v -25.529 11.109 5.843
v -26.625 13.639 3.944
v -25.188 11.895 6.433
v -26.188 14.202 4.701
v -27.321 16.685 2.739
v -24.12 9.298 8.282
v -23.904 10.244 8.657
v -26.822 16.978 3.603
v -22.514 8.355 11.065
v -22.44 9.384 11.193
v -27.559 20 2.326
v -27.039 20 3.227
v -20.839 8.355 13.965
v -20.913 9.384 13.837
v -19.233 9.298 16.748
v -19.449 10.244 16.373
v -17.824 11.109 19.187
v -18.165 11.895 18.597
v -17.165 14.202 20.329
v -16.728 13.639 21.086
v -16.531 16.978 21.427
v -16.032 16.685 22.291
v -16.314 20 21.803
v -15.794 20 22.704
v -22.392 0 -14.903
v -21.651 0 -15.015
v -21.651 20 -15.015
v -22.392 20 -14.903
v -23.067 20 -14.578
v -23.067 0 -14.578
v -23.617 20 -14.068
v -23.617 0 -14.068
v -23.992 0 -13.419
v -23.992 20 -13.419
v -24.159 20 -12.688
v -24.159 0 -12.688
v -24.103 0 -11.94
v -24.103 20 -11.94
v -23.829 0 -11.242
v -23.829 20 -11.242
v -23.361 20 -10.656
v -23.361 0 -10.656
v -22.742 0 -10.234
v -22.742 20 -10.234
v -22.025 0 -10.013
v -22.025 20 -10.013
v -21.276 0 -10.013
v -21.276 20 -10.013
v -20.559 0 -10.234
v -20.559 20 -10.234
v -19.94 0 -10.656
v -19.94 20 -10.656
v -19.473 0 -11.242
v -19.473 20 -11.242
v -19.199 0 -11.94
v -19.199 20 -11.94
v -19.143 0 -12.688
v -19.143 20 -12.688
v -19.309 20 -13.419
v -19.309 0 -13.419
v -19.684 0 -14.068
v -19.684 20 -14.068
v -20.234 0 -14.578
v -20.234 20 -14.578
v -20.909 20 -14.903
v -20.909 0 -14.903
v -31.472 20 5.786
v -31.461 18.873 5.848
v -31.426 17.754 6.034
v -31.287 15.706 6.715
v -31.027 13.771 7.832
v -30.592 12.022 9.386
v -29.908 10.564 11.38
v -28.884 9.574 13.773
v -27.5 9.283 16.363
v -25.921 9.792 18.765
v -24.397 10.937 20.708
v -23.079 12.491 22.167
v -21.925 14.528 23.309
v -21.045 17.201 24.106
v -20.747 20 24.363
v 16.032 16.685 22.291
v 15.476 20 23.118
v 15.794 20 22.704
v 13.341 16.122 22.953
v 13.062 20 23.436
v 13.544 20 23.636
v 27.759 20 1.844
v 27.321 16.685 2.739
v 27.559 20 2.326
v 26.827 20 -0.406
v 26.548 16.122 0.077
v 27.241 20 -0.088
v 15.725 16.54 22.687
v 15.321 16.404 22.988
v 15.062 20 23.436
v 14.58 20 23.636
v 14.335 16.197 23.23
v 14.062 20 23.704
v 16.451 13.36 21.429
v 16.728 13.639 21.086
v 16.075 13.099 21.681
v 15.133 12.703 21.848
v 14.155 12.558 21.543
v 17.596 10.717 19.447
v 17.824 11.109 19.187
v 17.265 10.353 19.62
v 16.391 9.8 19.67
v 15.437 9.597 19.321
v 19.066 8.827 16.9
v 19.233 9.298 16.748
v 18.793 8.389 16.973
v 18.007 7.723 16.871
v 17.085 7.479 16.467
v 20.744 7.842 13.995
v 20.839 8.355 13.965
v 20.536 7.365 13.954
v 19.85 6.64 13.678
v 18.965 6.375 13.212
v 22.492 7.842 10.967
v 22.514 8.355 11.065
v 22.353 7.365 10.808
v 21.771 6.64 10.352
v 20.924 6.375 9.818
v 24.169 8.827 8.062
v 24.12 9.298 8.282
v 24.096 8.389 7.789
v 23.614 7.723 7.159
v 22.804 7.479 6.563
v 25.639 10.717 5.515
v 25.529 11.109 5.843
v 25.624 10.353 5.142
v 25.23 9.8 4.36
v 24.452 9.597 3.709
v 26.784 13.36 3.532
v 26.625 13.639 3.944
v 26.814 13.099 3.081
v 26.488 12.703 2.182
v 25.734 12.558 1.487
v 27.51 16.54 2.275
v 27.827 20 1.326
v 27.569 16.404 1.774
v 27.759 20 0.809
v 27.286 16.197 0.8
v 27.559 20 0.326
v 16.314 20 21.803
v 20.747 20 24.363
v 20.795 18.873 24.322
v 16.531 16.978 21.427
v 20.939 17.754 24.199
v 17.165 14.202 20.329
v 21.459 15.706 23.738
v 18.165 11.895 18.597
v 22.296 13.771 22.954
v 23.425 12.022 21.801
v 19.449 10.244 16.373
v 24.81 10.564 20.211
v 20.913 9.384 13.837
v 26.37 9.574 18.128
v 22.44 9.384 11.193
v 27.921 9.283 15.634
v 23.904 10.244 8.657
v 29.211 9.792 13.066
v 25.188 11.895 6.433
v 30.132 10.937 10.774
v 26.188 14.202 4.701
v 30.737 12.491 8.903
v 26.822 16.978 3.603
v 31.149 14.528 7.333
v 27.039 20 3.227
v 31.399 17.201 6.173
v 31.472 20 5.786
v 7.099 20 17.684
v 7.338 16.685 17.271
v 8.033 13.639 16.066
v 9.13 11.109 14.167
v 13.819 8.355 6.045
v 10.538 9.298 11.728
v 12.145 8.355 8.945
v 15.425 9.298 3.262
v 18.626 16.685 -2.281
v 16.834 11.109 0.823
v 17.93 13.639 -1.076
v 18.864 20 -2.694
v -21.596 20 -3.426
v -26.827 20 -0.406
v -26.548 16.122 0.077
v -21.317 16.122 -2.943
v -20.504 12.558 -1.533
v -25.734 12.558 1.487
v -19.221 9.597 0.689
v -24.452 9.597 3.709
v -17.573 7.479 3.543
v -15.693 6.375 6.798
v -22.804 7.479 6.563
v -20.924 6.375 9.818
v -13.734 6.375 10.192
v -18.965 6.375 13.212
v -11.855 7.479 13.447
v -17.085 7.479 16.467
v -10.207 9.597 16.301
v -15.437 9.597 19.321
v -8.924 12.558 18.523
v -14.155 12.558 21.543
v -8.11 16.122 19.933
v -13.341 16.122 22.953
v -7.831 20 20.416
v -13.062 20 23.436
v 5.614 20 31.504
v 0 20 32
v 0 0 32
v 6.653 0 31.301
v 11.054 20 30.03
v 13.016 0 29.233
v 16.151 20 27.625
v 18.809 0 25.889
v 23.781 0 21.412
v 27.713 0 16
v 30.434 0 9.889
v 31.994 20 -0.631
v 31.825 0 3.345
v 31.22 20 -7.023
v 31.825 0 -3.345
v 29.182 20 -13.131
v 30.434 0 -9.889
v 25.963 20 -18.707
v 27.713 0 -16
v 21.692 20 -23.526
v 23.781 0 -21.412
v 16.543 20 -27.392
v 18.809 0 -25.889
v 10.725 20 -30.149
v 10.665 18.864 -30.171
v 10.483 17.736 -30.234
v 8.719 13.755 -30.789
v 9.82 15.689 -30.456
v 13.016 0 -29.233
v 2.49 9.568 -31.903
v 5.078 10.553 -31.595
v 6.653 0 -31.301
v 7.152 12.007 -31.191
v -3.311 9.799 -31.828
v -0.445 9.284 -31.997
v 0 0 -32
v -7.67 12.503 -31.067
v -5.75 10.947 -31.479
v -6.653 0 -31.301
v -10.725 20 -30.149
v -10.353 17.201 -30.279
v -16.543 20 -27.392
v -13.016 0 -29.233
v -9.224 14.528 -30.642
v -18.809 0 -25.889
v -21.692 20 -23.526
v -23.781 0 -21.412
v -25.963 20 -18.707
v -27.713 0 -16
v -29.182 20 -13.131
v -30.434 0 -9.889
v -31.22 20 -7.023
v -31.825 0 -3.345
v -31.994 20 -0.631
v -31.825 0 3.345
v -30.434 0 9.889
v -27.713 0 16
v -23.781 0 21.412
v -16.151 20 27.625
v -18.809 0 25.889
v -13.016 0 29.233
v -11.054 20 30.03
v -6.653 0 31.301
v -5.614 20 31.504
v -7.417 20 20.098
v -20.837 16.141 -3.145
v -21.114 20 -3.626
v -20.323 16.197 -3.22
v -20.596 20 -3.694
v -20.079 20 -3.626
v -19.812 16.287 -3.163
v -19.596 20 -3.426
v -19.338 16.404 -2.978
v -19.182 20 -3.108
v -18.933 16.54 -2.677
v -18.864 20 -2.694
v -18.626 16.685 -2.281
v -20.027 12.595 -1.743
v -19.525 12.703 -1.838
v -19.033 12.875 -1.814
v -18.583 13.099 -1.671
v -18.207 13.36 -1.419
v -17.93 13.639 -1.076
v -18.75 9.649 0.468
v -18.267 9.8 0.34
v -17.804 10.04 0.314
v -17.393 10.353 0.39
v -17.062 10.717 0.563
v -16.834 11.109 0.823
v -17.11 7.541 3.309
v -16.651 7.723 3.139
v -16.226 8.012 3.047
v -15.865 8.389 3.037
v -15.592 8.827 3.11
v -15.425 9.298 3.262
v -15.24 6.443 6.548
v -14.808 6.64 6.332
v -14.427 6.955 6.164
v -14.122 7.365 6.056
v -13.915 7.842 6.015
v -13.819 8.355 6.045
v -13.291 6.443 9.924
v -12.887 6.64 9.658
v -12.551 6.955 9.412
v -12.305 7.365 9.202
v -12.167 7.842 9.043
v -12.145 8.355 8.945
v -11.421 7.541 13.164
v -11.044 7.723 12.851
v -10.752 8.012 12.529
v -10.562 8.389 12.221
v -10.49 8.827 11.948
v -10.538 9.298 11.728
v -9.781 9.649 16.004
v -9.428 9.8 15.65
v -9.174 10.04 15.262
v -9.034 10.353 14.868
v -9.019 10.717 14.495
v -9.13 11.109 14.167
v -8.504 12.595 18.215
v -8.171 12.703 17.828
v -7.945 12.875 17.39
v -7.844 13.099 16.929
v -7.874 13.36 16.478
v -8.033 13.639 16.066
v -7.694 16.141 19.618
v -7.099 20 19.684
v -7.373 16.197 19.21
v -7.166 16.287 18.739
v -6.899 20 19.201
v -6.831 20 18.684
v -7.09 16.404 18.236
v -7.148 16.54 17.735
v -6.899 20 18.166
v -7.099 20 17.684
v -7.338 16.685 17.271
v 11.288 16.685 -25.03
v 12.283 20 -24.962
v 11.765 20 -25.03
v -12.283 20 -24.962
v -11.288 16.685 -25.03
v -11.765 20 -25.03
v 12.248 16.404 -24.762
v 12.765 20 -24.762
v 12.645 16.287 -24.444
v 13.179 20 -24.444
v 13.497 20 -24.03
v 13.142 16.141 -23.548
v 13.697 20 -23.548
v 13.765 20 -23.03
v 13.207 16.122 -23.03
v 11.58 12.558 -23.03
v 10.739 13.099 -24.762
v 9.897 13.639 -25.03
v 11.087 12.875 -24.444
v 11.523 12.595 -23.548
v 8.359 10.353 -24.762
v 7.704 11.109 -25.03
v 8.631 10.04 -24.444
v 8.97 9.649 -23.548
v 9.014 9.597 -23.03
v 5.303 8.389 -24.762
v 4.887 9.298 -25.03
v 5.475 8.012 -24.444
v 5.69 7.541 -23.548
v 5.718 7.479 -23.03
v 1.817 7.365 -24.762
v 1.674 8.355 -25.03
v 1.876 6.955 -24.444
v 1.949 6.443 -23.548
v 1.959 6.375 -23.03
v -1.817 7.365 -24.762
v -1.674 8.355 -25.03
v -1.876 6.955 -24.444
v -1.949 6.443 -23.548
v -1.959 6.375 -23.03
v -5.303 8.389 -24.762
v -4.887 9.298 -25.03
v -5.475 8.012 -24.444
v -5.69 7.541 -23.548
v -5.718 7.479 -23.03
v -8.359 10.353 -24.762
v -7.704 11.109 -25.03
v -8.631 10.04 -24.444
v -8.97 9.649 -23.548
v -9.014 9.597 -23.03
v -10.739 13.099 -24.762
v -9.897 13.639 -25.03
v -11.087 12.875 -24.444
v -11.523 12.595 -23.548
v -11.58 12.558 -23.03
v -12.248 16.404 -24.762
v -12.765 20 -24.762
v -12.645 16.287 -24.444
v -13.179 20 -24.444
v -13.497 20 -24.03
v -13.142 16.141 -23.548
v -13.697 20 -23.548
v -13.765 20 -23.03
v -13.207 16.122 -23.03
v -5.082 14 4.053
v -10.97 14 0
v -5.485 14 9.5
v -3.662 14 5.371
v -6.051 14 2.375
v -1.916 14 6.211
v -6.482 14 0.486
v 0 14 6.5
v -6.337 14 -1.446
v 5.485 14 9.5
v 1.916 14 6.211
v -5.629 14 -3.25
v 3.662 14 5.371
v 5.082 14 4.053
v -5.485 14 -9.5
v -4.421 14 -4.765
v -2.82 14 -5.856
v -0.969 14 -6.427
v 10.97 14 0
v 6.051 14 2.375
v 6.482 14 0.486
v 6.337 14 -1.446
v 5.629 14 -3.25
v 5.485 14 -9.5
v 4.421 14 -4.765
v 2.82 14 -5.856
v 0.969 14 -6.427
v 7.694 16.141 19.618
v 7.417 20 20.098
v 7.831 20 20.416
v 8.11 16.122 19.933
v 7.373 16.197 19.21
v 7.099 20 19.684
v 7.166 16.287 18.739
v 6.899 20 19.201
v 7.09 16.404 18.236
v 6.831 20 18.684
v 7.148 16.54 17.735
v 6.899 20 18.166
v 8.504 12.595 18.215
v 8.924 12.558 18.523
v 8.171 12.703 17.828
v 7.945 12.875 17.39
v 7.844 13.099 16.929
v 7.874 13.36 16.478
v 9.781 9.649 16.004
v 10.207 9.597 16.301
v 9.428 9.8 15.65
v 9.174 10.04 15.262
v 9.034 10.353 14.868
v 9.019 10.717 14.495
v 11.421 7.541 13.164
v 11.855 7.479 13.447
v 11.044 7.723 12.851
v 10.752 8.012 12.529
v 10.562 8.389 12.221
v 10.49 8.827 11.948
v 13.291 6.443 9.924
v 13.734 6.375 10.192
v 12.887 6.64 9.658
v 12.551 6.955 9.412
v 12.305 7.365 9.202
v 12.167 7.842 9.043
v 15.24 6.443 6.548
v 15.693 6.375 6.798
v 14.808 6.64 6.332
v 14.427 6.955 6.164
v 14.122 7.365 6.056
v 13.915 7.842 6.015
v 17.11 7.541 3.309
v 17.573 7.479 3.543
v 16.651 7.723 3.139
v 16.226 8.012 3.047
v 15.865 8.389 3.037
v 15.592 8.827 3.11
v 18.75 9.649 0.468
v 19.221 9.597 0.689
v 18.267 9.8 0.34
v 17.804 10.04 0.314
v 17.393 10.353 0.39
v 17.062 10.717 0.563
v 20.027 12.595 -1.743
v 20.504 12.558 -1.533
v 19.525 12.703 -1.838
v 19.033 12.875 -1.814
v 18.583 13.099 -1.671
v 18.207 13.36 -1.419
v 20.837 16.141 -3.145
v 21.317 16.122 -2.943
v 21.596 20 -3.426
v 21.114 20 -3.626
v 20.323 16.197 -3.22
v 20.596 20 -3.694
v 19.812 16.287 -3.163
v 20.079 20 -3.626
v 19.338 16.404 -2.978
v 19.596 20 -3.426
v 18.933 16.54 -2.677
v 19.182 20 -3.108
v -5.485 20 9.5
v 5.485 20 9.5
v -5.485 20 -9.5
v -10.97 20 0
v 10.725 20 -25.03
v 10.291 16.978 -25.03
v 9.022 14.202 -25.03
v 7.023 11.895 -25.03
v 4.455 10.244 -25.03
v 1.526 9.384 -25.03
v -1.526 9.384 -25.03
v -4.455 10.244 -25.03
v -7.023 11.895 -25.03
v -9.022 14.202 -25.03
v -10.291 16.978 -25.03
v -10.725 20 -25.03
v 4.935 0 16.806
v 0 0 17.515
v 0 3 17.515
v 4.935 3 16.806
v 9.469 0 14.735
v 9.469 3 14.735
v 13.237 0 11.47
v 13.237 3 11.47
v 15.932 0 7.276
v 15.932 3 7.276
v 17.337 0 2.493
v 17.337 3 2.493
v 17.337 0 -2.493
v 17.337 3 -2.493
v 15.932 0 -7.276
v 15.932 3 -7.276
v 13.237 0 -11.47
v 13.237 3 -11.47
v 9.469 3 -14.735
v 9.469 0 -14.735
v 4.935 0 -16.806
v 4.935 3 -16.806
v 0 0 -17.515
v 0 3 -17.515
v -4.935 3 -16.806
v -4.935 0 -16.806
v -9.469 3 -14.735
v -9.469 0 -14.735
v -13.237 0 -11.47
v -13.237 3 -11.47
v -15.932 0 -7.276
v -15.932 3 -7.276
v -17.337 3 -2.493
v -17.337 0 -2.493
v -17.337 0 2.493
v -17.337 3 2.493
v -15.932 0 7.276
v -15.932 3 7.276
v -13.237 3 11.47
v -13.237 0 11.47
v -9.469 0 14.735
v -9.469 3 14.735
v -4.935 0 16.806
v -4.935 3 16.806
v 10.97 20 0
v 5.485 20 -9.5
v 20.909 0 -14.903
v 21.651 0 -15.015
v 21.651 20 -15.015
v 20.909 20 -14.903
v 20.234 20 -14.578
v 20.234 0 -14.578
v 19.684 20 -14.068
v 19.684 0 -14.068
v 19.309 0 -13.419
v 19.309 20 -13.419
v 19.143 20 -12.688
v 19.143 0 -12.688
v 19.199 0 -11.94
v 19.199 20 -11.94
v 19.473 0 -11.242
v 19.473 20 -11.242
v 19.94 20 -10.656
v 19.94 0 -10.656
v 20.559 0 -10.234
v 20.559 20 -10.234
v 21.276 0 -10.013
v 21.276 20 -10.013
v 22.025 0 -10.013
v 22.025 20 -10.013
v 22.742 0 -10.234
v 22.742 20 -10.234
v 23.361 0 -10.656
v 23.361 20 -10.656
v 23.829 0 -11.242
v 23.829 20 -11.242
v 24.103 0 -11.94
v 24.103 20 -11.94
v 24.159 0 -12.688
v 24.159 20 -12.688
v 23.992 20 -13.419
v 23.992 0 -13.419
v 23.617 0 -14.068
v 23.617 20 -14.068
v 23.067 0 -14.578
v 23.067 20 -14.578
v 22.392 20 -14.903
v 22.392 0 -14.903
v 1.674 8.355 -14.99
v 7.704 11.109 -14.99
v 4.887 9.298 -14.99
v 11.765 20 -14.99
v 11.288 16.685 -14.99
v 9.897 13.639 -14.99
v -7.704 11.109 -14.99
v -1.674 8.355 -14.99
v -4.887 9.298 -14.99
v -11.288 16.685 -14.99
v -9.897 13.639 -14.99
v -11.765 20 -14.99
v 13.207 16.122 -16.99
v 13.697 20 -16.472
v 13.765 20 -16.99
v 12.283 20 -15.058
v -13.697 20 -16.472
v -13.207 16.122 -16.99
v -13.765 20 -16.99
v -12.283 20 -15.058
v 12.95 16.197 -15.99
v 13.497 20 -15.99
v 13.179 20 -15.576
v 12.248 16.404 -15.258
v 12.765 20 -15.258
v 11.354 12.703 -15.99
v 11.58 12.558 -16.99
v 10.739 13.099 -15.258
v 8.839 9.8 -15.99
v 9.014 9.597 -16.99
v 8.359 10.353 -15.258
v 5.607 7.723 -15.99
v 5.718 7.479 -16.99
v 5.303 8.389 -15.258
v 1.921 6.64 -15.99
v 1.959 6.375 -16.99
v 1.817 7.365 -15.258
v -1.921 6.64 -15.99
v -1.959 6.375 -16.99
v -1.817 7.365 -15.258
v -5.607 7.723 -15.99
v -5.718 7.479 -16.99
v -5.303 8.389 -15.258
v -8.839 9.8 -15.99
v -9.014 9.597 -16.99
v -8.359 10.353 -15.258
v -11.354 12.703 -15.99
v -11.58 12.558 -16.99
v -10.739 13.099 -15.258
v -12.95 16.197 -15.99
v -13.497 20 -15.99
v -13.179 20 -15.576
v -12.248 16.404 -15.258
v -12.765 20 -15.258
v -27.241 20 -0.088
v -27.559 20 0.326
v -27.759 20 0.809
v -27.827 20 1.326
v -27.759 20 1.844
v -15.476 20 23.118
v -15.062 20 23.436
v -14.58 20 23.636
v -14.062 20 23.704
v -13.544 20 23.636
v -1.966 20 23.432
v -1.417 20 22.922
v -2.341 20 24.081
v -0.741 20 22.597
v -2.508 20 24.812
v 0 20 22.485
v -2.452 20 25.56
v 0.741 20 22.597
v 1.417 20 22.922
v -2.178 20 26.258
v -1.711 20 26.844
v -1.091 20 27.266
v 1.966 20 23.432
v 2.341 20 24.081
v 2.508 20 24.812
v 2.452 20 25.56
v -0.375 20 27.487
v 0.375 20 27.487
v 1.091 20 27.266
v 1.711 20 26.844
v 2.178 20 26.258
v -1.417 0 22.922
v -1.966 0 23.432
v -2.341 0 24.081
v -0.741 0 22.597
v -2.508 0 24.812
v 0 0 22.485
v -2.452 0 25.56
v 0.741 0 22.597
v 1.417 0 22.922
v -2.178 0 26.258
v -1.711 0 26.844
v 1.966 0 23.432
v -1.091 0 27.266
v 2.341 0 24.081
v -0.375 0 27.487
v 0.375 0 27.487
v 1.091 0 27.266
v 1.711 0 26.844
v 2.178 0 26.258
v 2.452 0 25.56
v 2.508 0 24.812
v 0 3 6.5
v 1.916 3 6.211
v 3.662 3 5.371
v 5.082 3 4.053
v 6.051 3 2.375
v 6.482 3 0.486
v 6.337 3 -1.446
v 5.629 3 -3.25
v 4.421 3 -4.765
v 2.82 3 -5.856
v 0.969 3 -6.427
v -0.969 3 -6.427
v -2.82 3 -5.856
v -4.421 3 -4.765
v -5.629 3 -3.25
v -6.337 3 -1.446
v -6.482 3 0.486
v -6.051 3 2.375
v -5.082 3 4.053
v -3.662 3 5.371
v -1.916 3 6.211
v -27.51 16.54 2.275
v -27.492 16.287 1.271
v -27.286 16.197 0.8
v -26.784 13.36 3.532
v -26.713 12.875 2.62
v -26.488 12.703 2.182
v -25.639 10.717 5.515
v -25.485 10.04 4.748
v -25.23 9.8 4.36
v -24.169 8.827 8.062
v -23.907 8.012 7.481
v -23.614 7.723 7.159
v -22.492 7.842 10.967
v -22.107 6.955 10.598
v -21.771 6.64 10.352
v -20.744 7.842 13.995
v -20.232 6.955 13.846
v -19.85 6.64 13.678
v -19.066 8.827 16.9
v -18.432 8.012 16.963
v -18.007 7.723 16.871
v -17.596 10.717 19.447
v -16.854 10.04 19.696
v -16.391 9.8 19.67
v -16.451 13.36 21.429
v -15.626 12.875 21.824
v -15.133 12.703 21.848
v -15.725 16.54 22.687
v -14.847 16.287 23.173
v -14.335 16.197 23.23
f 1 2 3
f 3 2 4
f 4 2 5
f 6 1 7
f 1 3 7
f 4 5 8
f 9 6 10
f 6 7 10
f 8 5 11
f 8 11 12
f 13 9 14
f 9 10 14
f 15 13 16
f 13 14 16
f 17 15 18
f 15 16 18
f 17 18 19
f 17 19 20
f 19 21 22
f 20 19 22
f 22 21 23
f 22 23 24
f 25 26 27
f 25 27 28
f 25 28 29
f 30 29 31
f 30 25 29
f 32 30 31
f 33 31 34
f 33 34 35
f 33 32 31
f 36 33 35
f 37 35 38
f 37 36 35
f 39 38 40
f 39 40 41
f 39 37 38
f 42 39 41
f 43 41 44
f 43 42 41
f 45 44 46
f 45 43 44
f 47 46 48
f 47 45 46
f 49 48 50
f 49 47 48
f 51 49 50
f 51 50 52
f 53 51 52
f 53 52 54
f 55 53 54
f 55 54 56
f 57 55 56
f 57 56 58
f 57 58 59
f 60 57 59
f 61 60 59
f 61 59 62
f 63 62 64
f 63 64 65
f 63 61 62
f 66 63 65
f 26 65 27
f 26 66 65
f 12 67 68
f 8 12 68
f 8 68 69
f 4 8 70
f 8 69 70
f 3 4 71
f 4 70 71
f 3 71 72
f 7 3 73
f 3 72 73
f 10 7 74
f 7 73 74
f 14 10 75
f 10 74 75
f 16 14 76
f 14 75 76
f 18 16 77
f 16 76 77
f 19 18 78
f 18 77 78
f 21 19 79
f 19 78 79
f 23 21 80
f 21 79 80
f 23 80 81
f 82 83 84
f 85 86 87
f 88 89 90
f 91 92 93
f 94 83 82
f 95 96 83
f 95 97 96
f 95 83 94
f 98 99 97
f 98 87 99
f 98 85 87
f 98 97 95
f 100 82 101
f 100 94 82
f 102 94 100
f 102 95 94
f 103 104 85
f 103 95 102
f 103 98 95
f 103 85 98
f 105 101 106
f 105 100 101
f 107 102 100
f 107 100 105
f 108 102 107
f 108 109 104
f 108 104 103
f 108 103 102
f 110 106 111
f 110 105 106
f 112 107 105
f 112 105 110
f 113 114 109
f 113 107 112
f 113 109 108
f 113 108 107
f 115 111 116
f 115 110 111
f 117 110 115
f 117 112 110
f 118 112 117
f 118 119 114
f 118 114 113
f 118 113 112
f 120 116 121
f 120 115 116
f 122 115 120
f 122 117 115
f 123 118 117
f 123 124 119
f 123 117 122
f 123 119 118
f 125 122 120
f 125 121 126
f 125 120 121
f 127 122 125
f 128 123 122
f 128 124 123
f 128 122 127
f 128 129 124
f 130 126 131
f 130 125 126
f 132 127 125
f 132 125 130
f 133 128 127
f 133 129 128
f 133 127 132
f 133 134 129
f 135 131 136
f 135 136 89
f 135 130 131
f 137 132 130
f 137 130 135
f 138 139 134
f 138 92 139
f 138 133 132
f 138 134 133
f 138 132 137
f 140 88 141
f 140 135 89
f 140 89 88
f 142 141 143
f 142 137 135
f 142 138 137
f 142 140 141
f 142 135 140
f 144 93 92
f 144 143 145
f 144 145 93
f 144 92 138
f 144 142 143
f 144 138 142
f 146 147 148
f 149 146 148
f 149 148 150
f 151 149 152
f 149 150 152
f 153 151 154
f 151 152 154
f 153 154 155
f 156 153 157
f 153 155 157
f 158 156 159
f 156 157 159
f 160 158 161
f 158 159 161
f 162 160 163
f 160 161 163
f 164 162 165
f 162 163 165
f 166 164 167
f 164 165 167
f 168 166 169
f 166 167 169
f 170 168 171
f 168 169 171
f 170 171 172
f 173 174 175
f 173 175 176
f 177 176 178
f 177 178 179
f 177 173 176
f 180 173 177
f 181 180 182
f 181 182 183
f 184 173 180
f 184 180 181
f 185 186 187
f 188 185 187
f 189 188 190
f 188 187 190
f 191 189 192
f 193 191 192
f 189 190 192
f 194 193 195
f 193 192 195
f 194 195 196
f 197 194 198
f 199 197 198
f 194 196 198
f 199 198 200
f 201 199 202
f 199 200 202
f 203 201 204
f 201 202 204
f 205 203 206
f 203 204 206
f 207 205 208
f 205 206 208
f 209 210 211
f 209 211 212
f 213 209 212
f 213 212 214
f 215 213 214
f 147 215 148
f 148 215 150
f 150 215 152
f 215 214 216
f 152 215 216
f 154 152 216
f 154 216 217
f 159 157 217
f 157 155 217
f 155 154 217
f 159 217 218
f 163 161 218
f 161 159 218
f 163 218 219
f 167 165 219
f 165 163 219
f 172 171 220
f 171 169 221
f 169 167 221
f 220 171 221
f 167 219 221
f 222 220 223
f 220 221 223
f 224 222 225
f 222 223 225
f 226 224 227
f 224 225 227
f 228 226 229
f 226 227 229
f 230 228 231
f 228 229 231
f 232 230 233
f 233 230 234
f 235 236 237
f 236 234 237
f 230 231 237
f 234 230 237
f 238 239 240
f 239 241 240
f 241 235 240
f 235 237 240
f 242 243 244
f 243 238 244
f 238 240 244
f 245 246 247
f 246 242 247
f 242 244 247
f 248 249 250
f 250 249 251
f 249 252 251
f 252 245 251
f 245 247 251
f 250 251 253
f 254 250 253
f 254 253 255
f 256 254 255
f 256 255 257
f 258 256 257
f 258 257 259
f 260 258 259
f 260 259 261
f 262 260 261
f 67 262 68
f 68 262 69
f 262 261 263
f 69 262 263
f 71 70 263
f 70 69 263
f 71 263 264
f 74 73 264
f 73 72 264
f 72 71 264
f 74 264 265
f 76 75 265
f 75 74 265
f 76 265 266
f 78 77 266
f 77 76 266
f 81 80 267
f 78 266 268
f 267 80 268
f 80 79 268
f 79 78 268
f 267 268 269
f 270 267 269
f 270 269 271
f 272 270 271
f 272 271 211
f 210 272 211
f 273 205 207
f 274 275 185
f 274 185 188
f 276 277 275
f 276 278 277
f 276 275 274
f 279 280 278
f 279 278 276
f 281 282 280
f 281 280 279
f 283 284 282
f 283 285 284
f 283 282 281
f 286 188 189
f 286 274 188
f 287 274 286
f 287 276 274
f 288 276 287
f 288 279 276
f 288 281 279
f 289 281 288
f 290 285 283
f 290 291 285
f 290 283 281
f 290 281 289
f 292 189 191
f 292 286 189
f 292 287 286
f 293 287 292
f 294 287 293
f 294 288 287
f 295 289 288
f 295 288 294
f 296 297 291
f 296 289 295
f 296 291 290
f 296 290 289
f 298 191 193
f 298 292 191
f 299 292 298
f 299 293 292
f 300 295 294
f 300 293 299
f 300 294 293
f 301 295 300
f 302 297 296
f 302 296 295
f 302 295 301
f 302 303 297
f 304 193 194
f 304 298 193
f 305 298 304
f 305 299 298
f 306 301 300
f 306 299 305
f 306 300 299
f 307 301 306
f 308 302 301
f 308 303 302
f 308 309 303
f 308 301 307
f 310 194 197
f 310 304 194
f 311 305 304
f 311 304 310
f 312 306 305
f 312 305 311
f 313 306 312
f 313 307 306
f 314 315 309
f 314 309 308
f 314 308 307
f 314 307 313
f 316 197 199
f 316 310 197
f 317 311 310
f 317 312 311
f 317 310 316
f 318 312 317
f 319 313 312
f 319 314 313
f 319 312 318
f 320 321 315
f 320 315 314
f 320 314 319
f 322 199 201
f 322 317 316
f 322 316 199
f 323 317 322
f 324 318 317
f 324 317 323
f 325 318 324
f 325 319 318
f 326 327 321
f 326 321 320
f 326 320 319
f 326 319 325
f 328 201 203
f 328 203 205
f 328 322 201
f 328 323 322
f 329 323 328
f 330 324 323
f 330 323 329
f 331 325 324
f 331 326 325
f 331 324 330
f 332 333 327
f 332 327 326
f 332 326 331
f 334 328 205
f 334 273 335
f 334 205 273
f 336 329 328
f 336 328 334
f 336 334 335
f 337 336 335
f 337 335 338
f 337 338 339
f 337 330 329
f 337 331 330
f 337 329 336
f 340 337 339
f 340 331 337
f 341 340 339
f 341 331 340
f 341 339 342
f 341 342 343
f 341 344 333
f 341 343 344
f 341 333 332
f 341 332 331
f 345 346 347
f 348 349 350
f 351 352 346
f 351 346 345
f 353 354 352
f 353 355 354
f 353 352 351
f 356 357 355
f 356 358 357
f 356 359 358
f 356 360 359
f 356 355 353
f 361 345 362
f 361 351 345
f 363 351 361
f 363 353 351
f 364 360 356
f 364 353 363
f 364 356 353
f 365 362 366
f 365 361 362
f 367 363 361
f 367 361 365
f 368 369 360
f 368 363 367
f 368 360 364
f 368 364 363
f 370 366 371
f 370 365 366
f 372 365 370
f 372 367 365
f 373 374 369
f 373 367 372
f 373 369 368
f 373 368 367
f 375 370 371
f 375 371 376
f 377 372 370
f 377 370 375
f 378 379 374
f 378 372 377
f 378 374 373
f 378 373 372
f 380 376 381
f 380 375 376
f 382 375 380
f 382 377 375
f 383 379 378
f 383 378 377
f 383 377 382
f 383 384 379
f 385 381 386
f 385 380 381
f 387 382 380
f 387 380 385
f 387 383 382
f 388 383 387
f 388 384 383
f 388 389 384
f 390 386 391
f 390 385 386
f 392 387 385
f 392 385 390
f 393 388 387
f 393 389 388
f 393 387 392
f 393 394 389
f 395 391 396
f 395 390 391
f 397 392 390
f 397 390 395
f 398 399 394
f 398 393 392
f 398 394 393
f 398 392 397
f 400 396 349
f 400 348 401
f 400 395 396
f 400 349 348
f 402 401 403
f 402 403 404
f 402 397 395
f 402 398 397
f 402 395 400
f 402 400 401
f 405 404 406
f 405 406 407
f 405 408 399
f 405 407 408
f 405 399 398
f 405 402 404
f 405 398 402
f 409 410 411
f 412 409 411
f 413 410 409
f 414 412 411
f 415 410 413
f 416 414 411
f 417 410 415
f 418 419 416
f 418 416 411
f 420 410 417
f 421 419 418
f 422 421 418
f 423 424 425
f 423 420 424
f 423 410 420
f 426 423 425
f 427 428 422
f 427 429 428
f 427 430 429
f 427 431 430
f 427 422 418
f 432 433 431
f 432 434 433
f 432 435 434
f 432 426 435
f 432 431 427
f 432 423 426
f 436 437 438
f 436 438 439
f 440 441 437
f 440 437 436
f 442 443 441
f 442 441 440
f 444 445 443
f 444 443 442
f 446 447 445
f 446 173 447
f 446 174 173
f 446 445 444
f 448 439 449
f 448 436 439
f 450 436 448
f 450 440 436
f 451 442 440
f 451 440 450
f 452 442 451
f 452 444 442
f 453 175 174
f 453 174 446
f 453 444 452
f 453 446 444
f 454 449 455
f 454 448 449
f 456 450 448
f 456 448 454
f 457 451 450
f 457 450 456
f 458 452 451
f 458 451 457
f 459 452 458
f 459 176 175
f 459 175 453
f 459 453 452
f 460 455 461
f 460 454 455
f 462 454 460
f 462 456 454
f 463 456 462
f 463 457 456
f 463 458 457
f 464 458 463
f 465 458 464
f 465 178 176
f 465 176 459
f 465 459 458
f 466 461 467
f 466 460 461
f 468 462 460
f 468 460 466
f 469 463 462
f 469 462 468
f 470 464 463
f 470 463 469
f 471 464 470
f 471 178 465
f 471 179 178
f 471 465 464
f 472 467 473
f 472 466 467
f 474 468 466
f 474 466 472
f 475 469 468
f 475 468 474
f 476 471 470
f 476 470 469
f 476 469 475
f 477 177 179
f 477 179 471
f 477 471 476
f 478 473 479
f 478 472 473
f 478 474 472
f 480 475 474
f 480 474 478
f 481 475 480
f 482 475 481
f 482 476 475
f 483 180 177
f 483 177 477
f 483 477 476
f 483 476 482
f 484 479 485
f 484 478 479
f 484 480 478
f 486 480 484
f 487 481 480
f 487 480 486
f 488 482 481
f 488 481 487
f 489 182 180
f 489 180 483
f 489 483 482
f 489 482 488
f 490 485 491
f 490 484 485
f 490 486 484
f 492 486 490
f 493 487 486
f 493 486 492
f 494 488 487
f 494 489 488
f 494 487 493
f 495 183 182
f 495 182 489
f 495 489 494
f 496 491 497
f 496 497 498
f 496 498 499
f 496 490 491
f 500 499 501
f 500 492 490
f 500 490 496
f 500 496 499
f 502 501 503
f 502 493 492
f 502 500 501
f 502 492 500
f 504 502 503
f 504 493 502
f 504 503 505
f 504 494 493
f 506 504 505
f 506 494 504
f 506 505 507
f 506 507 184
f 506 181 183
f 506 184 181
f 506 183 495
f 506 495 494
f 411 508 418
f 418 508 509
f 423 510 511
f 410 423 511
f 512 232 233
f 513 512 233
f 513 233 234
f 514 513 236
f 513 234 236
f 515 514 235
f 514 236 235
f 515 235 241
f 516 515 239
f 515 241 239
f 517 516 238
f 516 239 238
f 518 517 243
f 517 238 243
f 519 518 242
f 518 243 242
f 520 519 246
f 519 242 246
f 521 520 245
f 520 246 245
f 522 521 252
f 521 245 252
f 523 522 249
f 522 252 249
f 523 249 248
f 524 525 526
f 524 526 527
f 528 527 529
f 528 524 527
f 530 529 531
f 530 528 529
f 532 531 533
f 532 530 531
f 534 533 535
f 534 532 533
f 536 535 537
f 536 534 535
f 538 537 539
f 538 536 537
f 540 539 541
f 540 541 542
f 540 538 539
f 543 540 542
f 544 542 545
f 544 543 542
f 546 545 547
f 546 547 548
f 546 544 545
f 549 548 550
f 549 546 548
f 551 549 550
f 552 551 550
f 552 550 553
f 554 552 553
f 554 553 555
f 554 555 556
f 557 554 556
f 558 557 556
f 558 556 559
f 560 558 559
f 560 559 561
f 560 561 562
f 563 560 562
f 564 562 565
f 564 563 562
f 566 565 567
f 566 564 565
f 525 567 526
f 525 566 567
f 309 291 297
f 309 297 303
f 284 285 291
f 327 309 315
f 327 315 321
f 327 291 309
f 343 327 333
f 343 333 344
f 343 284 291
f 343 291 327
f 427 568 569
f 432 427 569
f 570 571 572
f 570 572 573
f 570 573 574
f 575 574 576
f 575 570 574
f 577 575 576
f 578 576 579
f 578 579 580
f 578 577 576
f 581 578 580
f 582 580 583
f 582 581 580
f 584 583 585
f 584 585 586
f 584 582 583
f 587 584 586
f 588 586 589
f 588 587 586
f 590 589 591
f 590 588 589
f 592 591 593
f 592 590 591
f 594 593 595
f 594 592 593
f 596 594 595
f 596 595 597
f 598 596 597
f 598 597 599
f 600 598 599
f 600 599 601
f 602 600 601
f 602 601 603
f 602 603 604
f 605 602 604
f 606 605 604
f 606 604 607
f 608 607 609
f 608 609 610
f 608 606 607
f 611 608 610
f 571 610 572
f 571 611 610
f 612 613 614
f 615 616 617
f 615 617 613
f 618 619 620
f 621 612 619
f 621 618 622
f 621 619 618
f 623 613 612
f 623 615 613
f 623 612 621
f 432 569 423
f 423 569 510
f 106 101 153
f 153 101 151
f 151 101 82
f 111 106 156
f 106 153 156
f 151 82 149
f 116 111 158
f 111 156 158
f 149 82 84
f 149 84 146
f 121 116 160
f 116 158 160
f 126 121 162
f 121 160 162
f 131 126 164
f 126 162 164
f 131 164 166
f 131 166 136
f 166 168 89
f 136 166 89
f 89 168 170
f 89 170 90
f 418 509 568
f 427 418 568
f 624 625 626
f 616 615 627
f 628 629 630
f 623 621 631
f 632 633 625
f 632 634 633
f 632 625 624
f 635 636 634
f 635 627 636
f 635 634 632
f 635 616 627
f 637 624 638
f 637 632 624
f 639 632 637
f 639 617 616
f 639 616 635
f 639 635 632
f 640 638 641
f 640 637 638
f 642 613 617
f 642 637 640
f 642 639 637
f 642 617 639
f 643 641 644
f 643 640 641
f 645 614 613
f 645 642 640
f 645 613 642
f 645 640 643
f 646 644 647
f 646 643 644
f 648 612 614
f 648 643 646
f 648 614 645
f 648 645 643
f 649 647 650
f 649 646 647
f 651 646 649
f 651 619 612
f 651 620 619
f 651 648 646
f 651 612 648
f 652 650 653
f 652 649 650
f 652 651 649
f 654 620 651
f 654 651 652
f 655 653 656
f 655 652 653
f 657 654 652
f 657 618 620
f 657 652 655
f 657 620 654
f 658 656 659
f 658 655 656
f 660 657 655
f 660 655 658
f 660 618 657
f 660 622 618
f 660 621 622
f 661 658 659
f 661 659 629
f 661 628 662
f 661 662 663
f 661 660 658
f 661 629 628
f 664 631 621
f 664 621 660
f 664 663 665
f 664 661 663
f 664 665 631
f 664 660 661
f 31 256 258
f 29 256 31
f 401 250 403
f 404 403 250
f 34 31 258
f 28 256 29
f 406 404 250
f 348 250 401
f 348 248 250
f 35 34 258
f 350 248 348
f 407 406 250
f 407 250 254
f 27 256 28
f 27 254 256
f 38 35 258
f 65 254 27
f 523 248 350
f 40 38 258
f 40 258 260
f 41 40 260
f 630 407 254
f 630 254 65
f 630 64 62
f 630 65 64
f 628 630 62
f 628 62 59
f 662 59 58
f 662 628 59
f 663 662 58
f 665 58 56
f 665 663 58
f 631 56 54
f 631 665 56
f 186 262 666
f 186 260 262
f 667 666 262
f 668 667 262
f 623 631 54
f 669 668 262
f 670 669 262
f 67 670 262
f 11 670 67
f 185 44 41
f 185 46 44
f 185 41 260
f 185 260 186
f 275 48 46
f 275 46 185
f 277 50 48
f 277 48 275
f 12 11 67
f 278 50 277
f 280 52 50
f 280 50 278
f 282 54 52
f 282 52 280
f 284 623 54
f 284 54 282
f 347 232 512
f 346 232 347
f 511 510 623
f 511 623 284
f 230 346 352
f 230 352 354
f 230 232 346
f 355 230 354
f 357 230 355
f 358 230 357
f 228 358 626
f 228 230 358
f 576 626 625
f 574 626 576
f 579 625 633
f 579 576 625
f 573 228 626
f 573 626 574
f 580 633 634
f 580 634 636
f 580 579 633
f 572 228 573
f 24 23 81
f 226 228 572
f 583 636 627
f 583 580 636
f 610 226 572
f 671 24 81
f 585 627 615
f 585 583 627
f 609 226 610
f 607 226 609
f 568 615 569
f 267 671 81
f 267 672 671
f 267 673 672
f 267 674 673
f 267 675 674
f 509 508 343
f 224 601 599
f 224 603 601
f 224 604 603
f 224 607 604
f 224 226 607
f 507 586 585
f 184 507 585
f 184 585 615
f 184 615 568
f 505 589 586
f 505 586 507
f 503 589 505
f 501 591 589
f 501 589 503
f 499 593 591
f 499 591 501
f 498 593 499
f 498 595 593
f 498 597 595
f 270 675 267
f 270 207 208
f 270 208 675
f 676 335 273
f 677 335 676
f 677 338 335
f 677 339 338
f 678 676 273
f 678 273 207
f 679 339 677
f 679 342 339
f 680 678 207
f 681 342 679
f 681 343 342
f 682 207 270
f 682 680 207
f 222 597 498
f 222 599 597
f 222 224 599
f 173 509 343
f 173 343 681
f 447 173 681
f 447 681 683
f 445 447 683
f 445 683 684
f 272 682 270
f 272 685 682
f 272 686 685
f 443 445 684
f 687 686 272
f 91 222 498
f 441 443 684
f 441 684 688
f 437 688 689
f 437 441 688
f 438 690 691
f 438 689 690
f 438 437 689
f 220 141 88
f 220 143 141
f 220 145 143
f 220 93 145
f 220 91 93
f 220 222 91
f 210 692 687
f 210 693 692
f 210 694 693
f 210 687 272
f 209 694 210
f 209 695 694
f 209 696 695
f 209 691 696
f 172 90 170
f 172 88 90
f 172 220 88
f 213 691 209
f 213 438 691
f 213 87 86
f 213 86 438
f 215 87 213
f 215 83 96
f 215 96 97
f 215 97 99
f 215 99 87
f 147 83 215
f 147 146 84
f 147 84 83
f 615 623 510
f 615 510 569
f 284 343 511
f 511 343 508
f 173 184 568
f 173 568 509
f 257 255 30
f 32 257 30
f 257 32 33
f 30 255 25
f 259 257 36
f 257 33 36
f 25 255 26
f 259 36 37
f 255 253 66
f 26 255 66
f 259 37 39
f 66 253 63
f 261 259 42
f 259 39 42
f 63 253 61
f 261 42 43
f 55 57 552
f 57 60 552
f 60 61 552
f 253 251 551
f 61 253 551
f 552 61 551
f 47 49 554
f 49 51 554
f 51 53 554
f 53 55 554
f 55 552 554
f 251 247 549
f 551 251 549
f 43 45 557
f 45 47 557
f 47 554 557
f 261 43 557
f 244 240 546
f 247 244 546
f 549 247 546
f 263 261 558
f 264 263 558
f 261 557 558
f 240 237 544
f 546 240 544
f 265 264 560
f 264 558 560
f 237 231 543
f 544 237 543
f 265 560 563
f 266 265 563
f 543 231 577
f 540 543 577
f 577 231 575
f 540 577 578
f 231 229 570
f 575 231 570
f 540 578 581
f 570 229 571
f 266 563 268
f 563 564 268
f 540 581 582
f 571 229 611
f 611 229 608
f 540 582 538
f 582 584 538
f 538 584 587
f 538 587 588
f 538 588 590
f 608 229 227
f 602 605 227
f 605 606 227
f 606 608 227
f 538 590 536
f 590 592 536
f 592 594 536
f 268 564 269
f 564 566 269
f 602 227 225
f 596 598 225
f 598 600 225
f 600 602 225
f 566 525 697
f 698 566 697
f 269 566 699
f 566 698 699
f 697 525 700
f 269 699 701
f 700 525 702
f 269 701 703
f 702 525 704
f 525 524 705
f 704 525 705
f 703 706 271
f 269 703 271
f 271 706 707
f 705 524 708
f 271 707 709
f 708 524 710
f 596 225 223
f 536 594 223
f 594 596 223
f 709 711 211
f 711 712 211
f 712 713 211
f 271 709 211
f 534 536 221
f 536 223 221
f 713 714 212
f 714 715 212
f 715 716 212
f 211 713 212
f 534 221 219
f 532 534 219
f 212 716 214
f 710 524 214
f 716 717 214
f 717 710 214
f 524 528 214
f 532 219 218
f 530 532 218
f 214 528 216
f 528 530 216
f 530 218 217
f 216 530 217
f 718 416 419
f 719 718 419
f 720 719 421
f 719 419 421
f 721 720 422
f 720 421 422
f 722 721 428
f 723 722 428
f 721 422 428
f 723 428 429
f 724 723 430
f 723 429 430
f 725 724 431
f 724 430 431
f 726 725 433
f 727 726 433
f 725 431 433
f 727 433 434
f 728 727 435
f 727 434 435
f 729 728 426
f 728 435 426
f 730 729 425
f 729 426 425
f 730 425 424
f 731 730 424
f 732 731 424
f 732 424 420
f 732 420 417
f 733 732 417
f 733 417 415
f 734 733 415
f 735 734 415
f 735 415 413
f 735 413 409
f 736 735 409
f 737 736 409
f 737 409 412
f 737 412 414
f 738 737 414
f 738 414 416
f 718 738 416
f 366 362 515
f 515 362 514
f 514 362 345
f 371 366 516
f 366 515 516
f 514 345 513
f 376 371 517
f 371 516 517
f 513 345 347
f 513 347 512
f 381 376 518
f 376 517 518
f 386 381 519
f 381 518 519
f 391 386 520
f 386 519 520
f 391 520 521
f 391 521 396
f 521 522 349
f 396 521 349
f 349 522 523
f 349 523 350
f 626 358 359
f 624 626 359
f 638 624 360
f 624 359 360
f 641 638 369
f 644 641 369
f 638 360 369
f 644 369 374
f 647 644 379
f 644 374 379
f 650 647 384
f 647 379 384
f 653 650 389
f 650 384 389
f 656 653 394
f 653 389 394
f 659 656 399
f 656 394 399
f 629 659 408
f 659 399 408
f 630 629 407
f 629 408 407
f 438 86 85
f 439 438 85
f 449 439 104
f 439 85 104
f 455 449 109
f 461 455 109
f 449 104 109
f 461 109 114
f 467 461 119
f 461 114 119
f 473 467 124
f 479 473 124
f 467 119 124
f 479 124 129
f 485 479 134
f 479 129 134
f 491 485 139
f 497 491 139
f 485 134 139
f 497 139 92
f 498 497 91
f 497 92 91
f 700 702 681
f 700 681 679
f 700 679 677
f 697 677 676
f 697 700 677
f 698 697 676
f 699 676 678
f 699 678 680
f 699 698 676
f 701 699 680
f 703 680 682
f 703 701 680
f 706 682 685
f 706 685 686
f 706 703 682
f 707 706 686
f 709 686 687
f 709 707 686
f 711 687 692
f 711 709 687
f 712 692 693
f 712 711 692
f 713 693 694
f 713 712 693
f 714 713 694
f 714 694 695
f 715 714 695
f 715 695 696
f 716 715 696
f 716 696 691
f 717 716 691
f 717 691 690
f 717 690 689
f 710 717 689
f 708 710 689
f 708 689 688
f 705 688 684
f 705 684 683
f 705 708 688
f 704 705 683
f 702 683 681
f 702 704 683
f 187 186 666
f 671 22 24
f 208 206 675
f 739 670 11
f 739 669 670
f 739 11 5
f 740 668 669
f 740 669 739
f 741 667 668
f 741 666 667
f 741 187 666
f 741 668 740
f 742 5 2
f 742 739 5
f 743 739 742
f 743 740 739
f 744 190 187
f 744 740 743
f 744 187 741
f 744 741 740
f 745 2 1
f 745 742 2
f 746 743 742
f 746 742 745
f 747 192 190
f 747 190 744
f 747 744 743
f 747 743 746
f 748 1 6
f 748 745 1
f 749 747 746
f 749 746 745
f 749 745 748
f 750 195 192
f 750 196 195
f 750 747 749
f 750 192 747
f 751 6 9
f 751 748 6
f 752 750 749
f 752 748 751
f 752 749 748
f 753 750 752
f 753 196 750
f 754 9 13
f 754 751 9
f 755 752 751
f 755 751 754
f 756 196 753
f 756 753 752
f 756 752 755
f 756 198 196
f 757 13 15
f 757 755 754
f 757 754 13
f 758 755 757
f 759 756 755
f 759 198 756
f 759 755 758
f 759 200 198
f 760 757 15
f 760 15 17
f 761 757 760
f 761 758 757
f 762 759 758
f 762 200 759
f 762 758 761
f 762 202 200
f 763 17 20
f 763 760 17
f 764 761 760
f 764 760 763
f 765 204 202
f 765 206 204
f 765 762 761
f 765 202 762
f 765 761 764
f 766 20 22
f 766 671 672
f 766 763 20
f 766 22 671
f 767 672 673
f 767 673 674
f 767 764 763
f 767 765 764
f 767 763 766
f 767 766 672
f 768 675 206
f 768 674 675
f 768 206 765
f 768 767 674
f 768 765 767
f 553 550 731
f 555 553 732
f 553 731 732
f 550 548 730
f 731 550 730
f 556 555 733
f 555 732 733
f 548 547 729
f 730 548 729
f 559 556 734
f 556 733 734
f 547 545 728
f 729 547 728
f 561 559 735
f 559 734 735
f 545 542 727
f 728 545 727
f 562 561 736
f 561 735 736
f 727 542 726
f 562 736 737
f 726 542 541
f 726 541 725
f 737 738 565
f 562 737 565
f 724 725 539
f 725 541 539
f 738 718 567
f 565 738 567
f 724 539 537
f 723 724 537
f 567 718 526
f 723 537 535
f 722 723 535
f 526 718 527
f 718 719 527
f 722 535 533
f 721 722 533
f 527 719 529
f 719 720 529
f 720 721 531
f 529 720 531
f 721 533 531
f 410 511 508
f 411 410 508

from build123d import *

# Parameters (mm, degrees)
SKETCH2_R                = 32
BOSS_EXTRUDE1_DEPTH      = 20
SKETCH3_R                = 10.725
CUT_EXTRUDE1_DEPTH       = 6.97
SKETCH4_R                = 13.765
CUT_EXTRUDE2_DEPTH       = 10.04
FILLET1_R                = 2
CIRPATTERN1_COUNT        = 3
FILLET1_OF_CIRPATTERN1_R = 2
SKETCH5_R                = 6.5
CUT_EXTRUDE3_DEPTH       = 20
SKETCH6_R                = 17.515
CUT_EXTRUDE4_DEPTH       = 3
SKETCH7_R                = 2.515
CUT_EXTRUDE5_DEPTH       = 20
CUT_EXTRUDE6_DEPTH       = 6


with BuildPart() as part:
    # Sketch2 → Boss-Extrude1 (new body)
    with BuildSketch(Plane(origin=(0, 0, 0), x_dir=(1, 0, 0), z_dir=(0, 1, 0))):
        with Locations(Location((0, 0, 0), (0, 0, 270))):
            Circle(SKETCH2_R)
    extrude(amount=BOSS_EXTRUDE1_DEPTH)

    # Sketch3 → Cut-Extrude1 (cut)
    with BuildSketch(Plane(origin=(0, 0, -32), x_dir=(-1, 0, 0), z_dir=(0, 0, -1))):
        with Locations((0, 20)):
            Circle(SKETCH3_R)
    cut_extrude1 = extrude(amount=-CUT_EXTRUDE1_DEPTH, mode=Mode.SUBTRACT)

    # Sketch4 → Cut-Extrude2 (cut)
    with BuildSketch(Plane(origin=(0, 0, -25.03), x_dir=(-1, 0, 0), z_dir=(0, 0, -1))):
        with Locations((0, 20)):
            Circle(SKETCH4_R)
    cut_extrude2 = extrude(amount=-CUT_EXTRUDE2_DEPTH, mode=Mode.SUBTRACT)

    # Fillet1
    fillet1_edges = [part.edges().sort_by_distance(p)[0] for p in [
        (0, 6.235, -25.03),
        (0, 6.235, -14.99),
    ]]
    fillet(fillet1_edges, radius=FILLET1_R)

    # CirPattern1: Cut-Extrude1, Cut-Extrude2 ×3 about axis
    cirpattern1_axis = Axis((0, 0, 0), (0, 1, 0))
    add([cut_extrude1.rotate(cirpattern1_axis, i * 360 / CIRPATTERN1_COUNT) for i in range(1, CIRPATTERN1_COUNT)], mode=Mode.SUBTRACT)
    add([cut_extrude2.rotate(cirpattern1_axis, i * 360 / CIRPATTERN1_COUNT) for i in range(1, CIRPATTERN1_COUNT)], mode=Mode.SUBTRACT)

    # Fillet1 of CirPattern1
    fillet1_of_cirpattern1_edges = [part.edges().sort_by_distance(p)[0] for p in [
        (-21.676615857, 6.235, 12.515),
        (-12.981720803, 6.235, 7.495),
        (21.676615857, 6.235, 12.515),
        (12.981720803, 6.235, 7.495),
    ]]
    fillet(fillet1_of_cirpattern1_edges, radius=FILLET1_OF_CIRPATTERN1_R)

    # Sketch5 → Cut-Extrude3 (cut)
    with BuildSketch(Plane(origin=(0, 20, 0), x_dir=(1, 0, 0), z_dir=(0, 1, 0))):
        with Locations(Location((0, 0, 0), (0, 0, 270))):
            Circle(SKETCH5_R)
    extrude(amount=-CUT_EXTRUDE3_DEPTH, mode=Mode.SUBTRACT)

    # Sketch6 → Cut-Extrude4 (cut)
    with BuildSketch(Plane(origin=(0, 0, 0), x_dir=(1, 0, 0), z_dir=(0, 1, 0))):
        with Locations(Location((0, 0, 0), (0, 0, 270))):
            Circle(SKETCH6_R)
    extrude(amount=CUT_EXTRUDE4_DEPTH, mode=Mode.SUBTRACT)

    # Sketch7 → Cut-Extrude5 (cut)
    with BuildSketch(Plane(origin=(0, 0, 0), x_dir=(1, 0, 0), z_dir=(0, 1, 0))):
        with Locations(Location((0, -25, 0), (0, 0, 90))):
            Circle(SKETCH7_R)
        with Locations(Location((-21.650635095, 12.5, 0), (0, 0, 90))):
            Circle(SKETCH7_R)
        with Locations(Location((21.650635095, 12.5, 0), (0, 0, 90))):
            Circle(SKETCH7_R)
    extrude(amount=CUT_EXTRUDE5_DEPTH, mode=Mode.SUBTRACT)

    # Sketch8 → Cut-Extrude6 (cut)
    with BuildSketch(Plane(origin=(0, 20, 0), x_dir=(1, 0, 0), z_dir=(0, 1, 0))):
        Polygon((5.484827557, 9.5), (-5.484827557, 9.5), (-10.969655115, 0), (-5.484827557, -9.5), (5.484827557, -9.5), (10.969655115, 0), align=None)
    extrude(amount=-CUT_EXTRUDE6_DEPTH, mode=Mode.SUBTRACT)


solid = part.part
